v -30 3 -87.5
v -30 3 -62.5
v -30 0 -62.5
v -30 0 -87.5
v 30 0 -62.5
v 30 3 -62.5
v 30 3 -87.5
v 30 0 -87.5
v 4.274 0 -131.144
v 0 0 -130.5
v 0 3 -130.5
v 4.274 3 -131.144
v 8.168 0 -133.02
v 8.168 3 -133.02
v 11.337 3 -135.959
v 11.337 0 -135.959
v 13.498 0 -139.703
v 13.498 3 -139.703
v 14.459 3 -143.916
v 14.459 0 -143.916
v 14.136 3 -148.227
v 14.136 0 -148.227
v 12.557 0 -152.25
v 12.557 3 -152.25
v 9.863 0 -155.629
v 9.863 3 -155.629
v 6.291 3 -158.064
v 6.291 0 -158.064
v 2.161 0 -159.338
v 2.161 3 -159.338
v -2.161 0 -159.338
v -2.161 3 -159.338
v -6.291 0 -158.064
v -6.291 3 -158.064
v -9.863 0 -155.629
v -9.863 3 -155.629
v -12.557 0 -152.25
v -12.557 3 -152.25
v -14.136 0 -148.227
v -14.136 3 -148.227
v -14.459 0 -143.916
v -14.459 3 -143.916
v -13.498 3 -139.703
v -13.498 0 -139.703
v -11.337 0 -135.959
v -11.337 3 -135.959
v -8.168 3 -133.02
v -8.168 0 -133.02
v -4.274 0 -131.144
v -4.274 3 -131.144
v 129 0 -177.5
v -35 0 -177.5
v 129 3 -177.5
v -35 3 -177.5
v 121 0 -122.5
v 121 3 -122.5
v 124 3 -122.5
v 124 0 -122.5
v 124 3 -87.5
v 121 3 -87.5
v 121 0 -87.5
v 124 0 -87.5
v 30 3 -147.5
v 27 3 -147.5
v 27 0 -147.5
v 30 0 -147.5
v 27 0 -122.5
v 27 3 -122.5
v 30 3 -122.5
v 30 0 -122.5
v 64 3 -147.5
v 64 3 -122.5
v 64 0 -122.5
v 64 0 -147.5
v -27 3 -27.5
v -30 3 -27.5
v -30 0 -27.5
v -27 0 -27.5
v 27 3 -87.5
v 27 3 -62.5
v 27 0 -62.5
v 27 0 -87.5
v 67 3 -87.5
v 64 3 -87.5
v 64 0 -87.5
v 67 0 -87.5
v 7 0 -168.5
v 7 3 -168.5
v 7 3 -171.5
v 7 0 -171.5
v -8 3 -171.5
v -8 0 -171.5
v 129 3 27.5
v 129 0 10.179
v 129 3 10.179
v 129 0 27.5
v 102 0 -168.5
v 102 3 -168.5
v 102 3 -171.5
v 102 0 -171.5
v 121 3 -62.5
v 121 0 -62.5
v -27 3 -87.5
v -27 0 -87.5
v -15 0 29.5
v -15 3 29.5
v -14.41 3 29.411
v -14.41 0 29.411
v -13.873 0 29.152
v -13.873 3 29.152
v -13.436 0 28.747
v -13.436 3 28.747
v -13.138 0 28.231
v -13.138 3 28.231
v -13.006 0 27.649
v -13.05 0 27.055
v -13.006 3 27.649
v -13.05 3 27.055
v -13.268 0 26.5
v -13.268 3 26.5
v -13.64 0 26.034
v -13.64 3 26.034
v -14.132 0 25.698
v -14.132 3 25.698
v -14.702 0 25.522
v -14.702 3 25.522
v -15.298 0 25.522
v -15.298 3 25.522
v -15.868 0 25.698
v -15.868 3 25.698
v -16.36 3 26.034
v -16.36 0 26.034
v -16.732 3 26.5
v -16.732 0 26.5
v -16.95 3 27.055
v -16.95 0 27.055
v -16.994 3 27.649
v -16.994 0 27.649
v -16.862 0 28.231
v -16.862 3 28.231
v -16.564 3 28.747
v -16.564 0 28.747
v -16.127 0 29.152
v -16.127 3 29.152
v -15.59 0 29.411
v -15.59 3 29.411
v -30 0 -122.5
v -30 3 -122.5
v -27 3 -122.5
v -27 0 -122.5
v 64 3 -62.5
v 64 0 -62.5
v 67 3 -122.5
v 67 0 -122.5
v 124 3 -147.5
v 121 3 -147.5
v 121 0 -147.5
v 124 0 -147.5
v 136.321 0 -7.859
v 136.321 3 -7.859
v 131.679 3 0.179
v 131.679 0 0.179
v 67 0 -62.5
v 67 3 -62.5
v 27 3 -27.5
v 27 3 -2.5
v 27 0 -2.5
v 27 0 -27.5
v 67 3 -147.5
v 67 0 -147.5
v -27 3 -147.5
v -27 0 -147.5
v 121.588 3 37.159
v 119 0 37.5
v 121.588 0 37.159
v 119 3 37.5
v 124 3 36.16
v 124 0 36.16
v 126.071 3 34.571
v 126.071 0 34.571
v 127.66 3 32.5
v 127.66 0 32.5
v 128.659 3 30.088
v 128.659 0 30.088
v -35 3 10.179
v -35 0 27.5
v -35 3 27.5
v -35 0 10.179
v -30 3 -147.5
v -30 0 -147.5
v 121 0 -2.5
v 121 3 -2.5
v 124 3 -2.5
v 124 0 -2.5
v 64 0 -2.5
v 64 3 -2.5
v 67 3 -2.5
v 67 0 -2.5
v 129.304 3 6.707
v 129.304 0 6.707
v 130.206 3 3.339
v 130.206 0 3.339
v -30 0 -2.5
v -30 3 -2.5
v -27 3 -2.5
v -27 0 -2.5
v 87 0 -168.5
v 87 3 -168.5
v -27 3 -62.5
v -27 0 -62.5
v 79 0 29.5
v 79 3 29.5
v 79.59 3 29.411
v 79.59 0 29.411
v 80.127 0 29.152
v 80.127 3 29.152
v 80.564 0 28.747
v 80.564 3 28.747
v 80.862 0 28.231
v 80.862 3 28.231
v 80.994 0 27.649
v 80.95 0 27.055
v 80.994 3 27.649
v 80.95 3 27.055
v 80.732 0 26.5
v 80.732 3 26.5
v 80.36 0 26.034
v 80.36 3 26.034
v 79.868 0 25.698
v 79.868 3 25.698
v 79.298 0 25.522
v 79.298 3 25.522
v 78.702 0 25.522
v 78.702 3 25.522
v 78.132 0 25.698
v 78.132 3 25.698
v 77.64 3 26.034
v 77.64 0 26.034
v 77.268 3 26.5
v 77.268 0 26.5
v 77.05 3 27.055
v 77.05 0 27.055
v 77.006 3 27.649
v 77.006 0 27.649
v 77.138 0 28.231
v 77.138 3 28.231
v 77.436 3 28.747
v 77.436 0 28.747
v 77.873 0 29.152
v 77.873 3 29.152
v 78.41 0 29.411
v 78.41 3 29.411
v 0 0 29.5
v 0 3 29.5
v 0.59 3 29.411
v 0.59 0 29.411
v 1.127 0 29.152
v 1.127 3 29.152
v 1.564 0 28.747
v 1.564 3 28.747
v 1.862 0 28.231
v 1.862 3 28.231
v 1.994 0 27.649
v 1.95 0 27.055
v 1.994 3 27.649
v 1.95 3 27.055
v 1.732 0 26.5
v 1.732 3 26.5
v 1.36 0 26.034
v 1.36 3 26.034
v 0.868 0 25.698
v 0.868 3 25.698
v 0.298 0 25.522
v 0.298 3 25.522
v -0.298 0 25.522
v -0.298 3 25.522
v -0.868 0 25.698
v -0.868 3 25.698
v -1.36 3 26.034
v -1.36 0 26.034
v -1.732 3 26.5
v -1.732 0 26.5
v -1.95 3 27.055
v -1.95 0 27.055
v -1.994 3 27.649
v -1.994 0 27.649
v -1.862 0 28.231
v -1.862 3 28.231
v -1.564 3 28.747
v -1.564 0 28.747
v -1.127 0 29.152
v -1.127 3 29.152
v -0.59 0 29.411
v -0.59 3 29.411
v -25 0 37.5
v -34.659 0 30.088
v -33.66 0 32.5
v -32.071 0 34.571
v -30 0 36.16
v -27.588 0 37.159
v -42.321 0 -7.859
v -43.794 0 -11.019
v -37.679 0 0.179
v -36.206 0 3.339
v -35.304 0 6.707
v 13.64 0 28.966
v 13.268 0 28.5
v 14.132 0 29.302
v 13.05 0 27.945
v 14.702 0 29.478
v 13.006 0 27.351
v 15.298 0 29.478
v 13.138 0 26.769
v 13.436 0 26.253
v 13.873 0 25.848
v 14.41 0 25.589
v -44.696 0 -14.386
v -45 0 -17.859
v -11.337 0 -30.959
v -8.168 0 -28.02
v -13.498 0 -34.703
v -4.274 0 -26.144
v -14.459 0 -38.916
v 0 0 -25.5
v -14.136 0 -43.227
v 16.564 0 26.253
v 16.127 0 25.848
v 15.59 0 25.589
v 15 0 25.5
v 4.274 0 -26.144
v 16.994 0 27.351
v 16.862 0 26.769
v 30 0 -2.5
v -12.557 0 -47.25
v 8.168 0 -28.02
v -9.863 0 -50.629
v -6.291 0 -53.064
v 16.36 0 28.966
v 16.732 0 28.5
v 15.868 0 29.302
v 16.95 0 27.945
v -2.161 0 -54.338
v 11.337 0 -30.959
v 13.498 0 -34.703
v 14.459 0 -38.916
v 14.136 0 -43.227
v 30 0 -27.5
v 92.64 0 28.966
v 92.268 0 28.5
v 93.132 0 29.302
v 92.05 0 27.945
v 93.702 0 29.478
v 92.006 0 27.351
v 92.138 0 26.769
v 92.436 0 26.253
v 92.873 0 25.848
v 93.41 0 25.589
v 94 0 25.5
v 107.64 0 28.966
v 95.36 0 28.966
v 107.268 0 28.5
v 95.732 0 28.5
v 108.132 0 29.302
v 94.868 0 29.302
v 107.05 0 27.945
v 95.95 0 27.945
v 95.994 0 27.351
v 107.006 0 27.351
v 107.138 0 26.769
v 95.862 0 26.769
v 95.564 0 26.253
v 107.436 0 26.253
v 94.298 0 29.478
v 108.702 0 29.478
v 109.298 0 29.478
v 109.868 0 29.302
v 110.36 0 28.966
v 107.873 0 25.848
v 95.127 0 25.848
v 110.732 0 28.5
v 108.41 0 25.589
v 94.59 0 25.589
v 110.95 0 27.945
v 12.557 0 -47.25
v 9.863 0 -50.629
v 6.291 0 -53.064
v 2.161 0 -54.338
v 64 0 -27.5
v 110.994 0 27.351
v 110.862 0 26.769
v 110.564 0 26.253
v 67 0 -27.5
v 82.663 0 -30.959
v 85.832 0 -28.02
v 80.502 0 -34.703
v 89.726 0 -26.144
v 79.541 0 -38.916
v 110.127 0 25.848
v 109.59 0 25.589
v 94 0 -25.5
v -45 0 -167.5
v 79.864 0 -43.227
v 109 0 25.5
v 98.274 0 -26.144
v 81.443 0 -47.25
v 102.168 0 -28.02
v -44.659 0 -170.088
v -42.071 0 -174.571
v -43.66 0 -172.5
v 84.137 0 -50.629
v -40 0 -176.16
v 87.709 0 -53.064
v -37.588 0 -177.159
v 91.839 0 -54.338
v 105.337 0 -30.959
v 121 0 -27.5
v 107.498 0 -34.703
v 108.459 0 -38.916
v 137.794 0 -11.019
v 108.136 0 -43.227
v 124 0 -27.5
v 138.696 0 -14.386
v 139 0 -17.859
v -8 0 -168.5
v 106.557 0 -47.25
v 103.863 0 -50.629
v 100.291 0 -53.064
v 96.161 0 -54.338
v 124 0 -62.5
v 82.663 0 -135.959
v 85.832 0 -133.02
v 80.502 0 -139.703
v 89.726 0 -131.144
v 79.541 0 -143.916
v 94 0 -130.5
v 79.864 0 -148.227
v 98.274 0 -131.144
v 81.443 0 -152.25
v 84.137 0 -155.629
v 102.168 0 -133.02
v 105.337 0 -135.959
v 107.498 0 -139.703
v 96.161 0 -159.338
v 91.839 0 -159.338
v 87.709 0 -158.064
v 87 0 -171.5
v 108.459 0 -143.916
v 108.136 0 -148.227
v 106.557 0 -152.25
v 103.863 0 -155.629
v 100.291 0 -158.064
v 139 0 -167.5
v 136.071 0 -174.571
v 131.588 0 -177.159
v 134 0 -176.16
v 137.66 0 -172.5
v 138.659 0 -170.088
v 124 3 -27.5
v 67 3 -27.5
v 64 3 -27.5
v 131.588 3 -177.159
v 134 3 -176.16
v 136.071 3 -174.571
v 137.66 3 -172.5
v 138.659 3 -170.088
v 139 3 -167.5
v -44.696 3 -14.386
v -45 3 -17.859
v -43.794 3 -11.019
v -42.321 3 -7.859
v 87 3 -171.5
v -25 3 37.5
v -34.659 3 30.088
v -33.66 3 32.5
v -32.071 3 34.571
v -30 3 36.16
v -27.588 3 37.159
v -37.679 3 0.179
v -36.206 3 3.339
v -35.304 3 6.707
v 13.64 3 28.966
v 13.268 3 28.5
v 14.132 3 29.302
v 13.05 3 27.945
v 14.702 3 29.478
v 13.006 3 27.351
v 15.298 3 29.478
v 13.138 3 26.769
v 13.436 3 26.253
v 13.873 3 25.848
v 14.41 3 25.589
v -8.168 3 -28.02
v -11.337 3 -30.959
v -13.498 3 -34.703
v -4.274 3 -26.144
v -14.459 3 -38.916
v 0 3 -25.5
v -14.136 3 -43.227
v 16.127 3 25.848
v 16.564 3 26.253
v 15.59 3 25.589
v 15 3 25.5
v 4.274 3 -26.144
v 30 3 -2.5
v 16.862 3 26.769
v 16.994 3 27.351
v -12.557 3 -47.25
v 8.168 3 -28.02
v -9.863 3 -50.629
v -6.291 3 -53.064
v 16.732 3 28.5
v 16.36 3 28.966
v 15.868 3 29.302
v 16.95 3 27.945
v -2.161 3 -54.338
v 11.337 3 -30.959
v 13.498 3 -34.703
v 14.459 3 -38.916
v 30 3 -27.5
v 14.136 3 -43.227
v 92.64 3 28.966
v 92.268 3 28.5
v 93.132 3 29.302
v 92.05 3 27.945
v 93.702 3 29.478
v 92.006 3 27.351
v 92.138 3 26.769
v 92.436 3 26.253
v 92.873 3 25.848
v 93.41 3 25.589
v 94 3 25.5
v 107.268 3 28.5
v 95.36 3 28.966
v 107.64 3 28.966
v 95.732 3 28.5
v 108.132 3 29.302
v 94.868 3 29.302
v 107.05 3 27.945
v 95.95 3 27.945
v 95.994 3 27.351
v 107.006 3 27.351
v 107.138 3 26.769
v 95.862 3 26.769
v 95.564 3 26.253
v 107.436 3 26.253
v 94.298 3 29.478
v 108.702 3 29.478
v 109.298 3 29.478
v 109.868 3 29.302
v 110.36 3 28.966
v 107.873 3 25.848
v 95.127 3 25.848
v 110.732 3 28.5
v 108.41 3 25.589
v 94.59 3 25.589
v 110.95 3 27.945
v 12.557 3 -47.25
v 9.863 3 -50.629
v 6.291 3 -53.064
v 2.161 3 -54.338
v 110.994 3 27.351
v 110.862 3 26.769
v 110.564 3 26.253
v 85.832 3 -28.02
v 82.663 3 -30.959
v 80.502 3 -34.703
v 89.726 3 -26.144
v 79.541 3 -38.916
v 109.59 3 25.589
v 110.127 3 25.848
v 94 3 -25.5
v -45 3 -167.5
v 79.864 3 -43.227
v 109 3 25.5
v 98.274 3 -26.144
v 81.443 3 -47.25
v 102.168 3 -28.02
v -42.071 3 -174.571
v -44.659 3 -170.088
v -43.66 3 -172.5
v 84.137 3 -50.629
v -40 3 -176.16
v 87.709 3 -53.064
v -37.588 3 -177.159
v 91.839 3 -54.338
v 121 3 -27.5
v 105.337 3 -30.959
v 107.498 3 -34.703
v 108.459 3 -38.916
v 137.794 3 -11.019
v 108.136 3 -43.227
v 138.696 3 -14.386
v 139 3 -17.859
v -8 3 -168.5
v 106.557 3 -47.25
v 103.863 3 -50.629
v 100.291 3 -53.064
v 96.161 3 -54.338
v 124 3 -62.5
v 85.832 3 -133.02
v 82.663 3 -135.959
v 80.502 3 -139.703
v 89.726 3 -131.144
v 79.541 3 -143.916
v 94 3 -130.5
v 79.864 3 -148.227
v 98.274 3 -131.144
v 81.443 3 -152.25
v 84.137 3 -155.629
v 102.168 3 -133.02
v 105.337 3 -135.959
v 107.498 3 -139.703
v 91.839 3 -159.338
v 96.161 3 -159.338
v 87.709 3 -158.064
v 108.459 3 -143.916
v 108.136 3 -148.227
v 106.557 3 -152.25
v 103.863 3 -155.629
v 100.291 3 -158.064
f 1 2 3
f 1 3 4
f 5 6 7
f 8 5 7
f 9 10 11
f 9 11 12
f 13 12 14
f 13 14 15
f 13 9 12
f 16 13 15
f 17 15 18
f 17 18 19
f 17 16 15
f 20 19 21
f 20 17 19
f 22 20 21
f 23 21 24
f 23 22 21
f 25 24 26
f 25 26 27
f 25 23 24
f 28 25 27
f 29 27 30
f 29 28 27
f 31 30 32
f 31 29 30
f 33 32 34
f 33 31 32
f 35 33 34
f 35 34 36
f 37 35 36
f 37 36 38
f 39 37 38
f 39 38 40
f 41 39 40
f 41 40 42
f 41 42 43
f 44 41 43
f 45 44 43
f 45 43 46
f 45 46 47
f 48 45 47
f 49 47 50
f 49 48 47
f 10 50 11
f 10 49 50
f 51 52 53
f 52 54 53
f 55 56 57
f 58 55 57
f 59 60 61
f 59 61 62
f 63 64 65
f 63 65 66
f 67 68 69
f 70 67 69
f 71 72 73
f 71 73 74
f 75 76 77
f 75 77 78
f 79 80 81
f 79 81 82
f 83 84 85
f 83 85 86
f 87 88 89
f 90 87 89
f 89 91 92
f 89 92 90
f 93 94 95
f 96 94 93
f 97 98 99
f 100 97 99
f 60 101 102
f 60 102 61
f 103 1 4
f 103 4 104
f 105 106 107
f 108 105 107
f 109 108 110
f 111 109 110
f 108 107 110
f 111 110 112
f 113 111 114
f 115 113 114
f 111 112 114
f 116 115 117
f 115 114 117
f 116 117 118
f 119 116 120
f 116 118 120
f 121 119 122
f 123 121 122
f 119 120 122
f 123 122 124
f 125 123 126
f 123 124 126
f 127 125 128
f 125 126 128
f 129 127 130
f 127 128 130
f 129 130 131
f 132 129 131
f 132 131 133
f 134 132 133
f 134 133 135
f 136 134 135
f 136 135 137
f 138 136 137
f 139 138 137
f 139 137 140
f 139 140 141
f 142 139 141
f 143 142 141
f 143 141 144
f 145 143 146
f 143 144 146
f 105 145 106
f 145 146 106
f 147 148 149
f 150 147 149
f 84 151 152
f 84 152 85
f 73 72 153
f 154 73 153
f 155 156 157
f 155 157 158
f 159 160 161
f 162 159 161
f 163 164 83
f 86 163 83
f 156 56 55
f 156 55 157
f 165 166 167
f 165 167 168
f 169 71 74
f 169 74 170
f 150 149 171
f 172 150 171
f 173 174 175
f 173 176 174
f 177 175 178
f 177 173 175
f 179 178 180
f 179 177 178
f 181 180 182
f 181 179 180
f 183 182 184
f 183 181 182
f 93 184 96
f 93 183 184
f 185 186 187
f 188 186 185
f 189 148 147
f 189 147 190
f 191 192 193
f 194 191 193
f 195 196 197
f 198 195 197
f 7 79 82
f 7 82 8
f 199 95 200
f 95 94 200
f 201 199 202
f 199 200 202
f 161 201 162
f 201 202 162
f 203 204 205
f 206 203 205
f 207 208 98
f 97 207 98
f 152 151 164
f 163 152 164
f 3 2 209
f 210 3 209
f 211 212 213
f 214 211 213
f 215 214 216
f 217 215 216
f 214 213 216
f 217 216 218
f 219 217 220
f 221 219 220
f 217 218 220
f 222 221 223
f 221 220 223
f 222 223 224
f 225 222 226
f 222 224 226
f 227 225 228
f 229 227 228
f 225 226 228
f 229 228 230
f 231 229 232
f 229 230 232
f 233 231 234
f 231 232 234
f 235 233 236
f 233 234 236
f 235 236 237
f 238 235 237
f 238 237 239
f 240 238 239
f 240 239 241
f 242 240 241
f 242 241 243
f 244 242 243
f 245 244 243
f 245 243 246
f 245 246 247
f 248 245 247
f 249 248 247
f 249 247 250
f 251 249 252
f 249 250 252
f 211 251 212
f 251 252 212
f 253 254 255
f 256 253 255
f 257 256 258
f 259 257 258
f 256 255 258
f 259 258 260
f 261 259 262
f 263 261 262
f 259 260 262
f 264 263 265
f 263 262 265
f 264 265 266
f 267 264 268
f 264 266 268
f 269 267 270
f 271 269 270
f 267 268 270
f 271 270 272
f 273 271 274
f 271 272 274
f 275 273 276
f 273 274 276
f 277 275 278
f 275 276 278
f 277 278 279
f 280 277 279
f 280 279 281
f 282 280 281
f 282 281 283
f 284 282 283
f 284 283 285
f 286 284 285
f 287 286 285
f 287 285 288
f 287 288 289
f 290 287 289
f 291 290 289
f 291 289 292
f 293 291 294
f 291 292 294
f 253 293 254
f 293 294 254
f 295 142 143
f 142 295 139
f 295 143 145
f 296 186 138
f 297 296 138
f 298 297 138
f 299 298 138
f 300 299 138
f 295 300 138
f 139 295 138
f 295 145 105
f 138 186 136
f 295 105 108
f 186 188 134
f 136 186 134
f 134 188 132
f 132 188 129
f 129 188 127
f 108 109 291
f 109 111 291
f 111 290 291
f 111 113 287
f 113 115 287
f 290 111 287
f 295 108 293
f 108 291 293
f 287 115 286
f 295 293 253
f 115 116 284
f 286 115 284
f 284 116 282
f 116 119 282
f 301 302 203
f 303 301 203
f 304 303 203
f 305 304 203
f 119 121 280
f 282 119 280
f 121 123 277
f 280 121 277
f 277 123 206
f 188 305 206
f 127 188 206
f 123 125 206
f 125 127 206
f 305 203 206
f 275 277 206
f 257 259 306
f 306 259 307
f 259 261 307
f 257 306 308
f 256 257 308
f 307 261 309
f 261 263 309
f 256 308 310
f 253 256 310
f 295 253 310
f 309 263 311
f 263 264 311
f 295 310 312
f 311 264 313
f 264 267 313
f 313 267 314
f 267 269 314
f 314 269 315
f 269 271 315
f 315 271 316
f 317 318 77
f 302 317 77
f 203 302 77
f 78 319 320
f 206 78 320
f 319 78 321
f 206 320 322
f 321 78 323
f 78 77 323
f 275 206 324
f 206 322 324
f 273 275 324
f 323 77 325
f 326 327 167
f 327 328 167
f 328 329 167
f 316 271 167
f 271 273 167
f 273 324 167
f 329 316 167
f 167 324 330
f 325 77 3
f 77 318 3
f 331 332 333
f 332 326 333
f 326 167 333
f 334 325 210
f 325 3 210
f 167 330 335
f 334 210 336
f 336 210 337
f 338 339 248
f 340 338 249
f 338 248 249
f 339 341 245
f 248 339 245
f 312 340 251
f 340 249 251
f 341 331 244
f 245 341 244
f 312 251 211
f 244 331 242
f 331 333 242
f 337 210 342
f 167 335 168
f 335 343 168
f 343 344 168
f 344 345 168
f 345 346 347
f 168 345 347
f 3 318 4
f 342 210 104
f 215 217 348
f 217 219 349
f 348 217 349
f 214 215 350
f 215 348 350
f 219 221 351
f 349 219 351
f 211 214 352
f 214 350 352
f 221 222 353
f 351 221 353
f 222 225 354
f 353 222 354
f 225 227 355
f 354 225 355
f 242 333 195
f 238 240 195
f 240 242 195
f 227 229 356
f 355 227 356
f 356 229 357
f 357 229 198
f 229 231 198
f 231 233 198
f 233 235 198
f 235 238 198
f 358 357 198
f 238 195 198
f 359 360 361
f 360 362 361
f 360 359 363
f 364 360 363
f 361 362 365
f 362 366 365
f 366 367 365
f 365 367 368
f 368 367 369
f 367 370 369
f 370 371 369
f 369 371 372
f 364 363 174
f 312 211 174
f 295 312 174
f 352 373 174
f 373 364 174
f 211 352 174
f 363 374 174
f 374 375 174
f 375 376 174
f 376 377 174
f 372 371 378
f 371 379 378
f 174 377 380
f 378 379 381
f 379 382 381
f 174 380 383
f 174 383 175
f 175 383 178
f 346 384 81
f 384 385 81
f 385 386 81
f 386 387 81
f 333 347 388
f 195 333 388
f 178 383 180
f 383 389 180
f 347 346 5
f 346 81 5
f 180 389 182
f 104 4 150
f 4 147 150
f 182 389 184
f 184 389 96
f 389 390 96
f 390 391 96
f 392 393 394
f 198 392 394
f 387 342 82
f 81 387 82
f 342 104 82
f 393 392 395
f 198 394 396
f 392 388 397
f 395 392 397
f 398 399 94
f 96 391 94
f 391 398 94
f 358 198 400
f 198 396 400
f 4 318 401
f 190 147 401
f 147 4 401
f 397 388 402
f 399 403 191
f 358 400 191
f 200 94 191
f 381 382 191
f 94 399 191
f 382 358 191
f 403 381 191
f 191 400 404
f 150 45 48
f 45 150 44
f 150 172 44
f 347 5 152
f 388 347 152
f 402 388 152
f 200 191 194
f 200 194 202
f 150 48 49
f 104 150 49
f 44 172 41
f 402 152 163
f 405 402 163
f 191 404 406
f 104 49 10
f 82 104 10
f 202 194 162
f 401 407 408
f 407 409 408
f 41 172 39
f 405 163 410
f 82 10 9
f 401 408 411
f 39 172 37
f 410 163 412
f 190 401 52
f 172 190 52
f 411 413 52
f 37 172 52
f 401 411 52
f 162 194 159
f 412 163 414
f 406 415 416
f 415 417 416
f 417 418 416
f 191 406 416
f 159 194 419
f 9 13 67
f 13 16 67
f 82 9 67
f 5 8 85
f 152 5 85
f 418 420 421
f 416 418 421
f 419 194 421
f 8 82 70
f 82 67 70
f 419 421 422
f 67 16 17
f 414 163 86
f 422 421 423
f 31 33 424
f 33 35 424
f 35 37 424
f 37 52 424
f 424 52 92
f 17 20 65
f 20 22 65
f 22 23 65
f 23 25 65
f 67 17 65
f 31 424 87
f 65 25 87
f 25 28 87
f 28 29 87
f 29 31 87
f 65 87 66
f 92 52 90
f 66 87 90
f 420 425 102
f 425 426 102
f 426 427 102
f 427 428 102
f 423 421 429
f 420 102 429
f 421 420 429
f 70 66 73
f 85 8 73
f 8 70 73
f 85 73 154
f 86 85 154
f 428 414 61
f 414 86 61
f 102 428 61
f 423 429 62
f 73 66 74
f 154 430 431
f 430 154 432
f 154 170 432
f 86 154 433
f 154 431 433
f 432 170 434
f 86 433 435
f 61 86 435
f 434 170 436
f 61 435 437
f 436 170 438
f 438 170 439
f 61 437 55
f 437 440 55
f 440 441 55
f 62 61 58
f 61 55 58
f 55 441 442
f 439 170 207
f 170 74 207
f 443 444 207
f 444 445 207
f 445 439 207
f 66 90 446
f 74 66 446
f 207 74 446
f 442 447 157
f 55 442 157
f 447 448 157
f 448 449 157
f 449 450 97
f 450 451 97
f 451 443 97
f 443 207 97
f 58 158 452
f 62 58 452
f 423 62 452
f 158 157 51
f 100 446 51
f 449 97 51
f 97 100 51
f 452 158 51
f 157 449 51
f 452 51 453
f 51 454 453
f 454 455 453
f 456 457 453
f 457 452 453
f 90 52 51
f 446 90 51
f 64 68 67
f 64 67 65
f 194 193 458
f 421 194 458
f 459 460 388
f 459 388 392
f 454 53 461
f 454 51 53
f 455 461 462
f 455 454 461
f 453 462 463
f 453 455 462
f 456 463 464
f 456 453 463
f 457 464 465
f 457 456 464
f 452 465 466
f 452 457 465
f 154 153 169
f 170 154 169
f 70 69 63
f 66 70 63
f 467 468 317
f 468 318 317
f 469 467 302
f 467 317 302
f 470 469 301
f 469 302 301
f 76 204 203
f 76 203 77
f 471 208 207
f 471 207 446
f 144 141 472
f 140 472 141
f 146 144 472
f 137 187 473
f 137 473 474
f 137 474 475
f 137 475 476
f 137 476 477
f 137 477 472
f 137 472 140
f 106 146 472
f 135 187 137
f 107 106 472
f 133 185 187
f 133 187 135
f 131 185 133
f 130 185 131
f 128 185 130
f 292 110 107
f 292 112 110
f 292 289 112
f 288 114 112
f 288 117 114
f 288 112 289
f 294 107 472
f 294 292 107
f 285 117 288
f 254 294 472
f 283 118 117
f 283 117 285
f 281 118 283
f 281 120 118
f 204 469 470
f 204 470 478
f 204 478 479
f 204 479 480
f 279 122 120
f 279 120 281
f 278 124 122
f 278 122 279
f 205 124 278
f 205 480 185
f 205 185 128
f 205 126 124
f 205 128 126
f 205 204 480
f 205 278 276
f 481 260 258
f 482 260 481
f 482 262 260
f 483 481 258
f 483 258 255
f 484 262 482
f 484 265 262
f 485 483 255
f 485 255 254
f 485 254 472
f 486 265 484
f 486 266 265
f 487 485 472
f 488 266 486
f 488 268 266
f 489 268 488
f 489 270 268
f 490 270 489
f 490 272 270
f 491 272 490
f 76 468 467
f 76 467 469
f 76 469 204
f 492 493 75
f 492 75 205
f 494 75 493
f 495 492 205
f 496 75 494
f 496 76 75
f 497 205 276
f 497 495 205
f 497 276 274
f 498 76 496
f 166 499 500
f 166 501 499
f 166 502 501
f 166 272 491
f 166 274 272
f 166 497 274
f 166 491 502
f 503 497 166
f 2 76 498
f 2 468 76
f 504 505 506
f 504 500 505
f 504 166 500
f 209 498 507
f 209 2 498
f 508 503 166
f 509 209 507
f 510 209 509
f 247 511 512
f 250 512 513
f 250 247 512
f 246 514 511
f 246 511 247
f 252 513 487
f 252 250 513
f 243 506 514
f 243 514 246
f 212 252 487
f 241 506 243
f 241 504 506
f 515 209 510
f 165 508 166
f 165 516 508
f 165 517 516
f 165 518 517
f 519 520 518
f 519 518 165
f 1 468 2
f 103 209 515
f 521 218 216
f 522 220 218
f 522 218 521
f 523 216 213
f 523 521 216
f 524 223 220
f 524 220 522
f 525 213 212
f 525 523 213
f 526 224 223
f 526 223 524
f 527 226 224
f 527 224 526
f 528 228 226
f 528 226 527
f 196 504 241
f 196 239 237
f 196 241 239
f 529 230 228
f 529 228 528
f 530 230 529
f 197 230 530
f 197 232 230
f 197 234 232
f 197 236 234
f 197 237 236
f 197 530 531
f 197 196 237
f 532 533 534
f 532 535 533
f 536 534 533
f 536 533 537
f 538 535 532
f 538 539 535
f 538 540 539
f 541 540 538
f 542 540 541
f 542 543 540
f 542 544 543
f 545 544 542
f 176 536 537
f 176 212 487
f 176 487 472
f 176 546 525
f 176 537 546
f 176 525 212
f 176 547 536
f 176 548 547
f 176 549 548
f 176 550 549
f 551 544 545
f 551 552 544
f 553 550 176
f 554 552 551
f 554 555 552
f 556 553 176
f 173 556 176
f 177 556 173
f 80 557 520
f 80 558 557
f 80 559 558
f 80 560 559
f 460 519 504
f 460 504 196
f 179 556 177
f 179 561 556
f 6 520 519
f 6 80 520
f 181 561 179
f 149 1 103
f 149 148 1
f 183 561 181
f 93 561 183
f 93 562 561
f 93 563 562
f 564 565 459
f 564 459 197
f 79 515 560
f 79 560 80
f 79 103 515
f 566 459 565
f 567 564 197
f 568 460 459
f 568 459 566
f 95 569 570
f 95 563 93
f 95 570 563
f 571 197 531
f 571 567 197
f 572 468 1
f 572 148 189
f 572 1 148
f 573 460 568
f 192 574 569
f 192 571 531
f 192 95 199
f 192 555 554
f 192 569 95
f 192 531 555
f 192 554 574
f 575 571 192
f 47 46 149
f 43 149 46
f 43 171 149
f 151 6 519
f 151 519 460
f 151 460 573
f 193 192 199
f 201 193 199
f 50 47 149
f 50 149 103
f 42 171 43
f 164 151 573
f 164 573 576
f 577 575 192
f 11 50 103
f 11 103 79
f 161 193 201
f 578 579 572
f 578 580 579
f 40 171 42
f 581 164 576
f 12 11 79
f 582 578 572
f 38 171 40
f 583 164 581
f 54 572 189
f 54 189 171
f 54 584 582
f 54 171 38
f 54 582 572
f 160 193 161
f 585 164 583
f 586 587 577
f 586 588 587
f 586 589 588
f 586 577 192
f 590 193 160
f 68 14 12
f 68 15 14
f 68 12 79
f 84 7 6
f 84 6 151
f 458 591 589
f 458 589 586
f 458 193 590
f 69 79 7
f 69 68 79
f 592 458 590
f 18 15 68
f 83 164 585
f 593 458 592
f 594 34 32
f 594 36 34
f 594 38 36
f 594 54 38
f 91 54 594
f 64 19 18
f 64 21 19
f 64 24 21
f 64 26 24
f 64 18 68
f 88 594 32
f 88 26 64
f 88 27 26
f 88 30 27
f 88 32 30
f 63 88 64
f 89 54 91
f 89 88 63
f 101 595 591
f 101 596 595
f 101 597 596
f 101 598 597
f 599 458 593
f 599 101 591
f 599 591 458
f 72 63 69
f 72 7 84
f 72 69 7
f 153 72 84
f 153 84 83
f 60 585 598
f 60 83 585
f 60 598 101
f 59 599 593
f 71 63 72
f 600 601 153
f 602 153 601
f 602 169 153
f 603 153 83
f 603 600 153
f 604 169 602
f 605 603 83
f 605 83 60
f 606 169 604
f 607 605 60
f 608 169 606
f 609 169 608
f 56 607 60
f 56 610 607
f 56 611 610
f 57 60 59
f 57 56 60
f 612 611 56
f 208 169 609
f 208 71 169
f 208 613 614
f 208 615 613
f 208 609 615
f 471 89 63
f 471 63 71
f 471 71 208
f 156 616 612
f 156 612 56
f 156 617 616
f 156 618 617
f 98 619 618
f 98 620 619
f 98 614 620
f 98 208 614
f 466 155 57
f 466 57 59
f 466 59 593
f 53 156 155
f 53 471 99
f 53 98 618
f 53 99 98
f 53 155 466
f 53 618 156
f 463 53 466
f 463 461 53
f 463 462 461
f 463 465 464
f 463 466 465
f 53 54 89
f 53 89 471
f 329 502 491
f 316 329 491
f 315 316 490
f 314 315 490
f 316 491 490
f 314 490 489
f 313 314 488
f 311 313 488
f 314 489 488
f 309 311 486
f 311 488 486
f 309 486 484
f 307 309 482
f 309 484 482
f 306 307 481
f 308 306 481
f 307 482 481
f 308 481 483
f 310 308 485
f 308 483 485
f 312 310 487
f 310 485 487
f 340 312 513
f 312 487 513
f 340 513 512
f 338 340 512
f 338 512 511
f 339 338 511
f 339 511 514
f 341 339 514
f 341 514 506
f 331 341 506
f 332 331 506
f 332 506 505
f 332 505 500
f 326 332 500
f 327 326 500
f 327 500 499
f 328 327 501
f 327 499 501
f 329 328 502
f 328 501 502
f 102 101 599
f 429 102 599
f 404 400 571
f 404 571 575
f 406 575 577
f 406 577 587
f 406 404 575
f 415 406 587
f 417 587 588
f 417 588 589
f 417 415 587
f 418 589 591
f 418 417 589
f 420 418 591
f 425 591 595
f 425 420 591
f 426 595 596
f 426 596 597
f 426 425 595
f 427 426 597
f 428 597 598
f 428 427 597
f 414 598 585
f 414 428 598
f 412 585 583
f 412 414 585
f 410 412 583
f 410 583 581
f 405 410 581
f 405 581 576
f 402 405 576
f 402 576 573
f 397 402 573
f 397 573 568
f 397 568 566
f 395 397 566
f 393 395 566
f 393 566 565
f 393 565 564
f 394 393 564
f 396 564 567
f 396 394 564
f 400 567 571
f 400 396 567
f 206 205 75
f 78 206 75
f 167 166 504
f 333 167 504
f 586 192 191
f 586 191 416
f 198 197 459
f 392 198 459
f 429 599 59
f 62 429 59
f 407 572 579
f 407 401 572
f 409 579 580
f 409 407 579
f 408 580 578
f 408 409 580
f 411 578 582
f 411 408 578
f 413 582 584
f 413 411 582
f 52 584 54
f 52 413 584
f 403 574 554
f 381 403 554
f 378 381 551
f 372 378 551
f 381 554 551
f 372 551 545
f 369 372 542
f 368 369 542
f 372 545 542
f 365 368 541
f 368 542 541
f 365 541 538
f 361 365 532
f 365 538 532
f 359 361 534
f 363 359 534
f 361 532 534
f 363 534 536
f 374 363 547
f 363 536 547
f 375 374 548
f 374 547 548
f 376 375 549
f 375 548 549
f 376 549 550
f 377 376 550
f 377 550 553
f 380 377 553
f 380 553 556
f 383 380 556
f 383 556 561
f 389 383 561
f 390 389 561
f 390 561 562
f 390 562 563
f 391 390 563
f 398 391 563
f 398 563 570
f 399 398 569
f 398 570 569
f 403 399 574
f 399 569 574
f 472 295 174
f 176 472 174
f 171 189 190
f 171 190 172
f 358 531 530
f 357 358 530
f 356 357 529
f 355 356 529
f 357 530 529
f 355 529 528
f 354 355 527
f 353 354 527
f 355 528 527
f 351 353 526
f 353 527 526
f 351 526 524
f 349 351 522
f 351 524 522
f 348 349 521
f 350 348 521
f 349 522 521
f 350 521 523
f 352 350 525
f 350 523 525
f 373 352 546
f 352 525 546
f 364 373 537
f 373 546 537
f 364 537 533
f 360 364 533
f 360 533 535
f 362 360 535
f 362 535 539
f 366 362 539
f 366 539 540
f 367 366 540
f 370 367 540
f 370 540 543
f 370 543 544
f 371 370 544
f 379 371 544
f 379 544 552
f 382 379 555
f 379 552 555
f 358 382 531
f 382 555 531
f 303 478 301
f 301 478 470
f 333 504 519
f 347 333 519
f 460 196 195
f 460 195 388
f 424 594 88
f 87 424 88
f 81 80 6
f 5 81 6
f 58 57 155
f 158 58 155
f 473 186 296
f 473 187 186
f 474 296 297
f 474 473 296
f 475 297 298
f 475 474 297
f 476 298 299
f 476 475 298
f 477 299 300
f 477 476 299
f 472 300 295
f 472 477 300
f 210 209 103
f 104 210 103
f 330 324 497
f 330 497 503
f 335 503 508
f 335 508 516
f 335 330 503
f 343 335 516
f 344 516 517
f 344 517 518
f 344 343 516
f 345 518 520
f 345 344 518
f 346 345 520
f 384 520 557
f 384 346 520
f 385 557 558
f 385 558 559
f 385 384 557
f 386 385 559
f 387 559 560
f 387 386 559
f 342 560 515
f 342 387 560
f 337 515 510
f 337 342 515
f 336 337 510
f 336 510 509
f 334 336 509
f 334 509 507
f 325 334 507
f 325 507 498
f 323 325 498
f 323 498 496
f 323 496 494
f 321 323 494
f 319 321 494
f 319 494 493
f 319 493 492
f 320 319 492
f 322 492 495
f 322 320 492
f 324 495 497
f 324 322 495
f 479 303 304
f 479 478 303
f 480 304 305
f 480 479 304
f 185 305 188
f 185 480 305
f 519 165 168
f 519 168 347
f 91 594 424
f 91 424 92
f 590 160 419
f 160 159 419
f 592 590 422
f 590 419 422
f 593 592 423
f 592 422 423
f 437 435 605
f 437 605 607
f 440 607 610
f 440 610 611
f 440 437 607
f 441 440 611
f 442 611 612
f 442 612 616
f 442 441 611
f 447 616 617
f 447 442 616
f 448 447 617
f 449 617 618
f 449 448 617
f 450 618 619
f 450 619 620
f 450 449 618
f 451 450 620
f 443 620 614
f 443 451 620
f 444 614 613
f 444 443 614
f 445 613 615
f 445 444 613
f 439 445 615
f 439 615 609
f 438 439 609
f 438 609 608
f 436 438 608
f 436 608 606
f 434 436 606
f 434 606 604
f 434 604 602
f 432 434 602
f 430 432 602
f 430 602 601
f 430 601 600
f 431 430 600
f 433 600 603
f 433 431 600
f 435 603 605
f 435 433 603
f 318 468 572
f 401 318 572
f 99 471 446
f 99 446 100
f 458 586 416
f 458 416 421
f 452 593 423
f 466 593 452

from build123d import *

# Parameters (mm, degrees)
SKETCH_1_W          = 164
SKETCH_1_H          = 215
SKETCH_1_R          = 14.5
EXTRUDE_1_DEPTH     = 3
SKETCH_2_R          = 2
CUT_EXTRUDE_1_DEPTH = 3
SKETCH_3_W          = 3
SKETCH_3_H          = 25
CUT_EXTRUDE_2_DEPTH = 10
SKETCH_4_W          = 15
SKETCH_4_H          = 3
CUT_EXTRUDE_3_DEPTH = 10
SKETCH_6_W          = 10
SKETCH_6_H          = 190
EXTRUDE_2_DEPTH     = 3
CHAMFER_1_SIZE      = 25
CHAMFER_1_SIZE_2    = 14.43375673
FILLET_3_R          = 20
FILLET_4_R          = 10


with BuildPart() as part:
    # 草图1 → 凸台-拉伸1 (new body)
    with BuildSketch(Plane(origin=(0, 0, 0), x_dir=(1, 0, 0), z_dir=(0, 1, 0))):
        with Locations((47, 70)):
            Rectangle(SKETCH_1_W, SKETCH_1_H)
        with Locations(Location((94, 40, 0), (0, 0, 270))):
            Circle(SKETCH_1_R, mode=Mode.SUBTRACT)
        with Locations(Location((0, 40, 0), (0, 0, 270))):
            Circle(SKETCH_1_R, mode=Mode.SUBTRACT)
        with Locations(Location((0, 145, 0), (0, 0, 270))):
            Circle(SKETCH_1_R, mode=Mode.SUBTRACT)
        with Locations(Location((94, 145, 0), (0, 0, 270))):
            Circle(SKETCH_1_R, mode=Mode.SUBTRACT)
    extrude(amount=EXTRUDE_1_DEPTH)

    # 草图2 → 切除-拉伸1 (cut)
    with BuildSketch(Plane(origin=(0, 3, 0), x_dir=(1, 0, 0), z_dir=(0, 1, 0))):
        with Locations(Location((0, -27.5, 0), (0, 0, 270))):
            Circle(SKETCH_2_R)
        with Locations(Location((-15, -27.5, 0), (0, 0, 270))):
            Circle(SKETCH_2_R)
        with Locations(Location((15, -27.5, 0), (0, 0, 90))):
            Circle(SKETCH_2_R)
        with Locations(Location((79, -27.5, 0), (0, 0, 270))):
            Circle(SKETCH_2_R)
        with Locations(Location((109, -27.5, 0), (0, 0, 90))):
            Circle(SKETCH_2_R)
        with Locations(Location((94, -27.5, 0), (0, 0, 90))):
            Circle(SKETCH_2_R)
    extrude(amount=-CUT_EXTRUDE_1_DEPTH, mode=Mode.SUBTRACT)

    # 草图3 → 切除-拉伸2 (cut)
    with BuildSketch(Plane(origin=(0, 3, 0), x_dir=(1, 0, 0), z_dir=(0, 1, 0))):
        with Locations((28.5, 135)):
            Rectangle(SKETCH_3_W, SKETCH_3_H)
        with Locations((65.5, 135)):
            Rectangle(SKETCH_3_W, SKETCH_3_H)
        with Locations((28.5, 75)):
            Rectangle(SKETCH_3_W, SKETCH_3_H)
        with Locations((65.5, 75)):
            Rectangle(SKETCH_3_W, SKETCH_3_H)
        with Locations((28.5, 15)):
            Rectangle(SKETCH_3_W, SKETCH_3_H)
        with Locations((65.5, 15)):
            Rectangle(SKETCH_3_W, SKETCH_3_H)
        with Locations((-28.5, 15)):
            Rectangle(SKETCH_3_W, SKETCH_3_H)
        with Locations((-28.5, 75)):
            Rectangle(SKETCH_3_W, SKETCH_3_H)
        with Locations((-28.5, 135)):
            Rectangle(SKETCH_3_W, SKETCH_3_H)
        with Locations((122.5, 135)):
            Rectangle(SKETCH_3_W, SKETCH_3_H)
        with Locations((122.5, 75)):
            Rectangle(SKETCH_3_W, SKETCH_3_H)
        with Locations((122.5, 15)):
            Rectangle(SKETCH_3_W, SKETCH_3_H)
    extrude(amount=-CUT_EXTRUDE_2_DEPTH, mode=Mode.SUBTRACT)

    # 草图4 → 切除-拉伸3 (cut)
    with BuildSketch(Plane(origin=(0, 3, 0), x_dir=(1, 0, 0), z_dir=(0, 1, 0))):
        with Locations((-0.5, 170)):
            Rectangle(SKETCH_4_W, SKETCH_4_H)
        with Locations((94.5, 170)):
            Rectangle(SKETCH_4_W, SKETCH_4_H)
    extrude(amount=-CUT_EXTRUDE_3_DEPTH, mode=Mode.SUBTRACT)

    # 草图6 → 凸台-拉伸2 (add)
    with BuildSketch(Plane(origin=(0, 3, 0), x_dir=(1, 0, 0), z_dir=(0, 1, 0))):
        with Locations((-40, 82.5)):
            Rectangle(SKETCH_6_W, SKETCH_6_H)
        with Locations((134, 82.5)):
            Rectangle(SKETCH_6_W, SKETCH_6_H)
    extrude(amount=-EXTRUDE_2_DEPTH)

    # 倒角1
    # the kernel refuses this chamfer: 25, 14.43375673 mm, written as the material it takes off along each edge
    with BuildSketch(Plane(origin=(139, 67.677143866, 12.5), x_dir=(0.019326765612700705, 0, -0.9998132206222079), z_dir=(0, -1, 0))) as chamfer_1_piece_1_section:
        Polygon((CHAMFER_1_SIZE * 0.999813220622, -CHAMFER_1_SIZE * 0.0193267656127), (-CHAMFER_1_SIZE_2 * 0.0193267656124, -CHAMFER_1_SIZE_2 * 0.999813220604), (0, 0), align=None)
    chamfer_1_piece_1 = extrude(amount=132.354287732, mode=Mode.PRIVATE)
    chamfer_1_piece_1 = split(chamfer_1_piece_1, bisect_by=Plane(origin=(129, 1.5, 3.344472452), z_dir=(1, 0, 0)), keep=Keep.TOP, mode=Mode.PRIVATE)
    add(chamfer_1_piece_1, mode=Mode.SUBTRACT)
    with BuildSketch(Plane(origin=(-45, 67.677143866, 12.5), x_dir=(0.9983227437537926, 0, 0.057893862402670776), z_dir=(0, -1, 0))) as chamfer_1_piece_2_section:
        Polygon((CHAMFER_1_SIZE_2 * 0.998322743736, -CHAMFER_1_SIZE_2 * 0.0578938624016), (-CHAMFER_1_SIZE * 0.0578938624027, -CHAMFER_1_SIZE * 0.998322743754), (0, 0), align=None)
    chamfer_1_piece_2 = extrude(amount=132.354287732, mode=Mode.PRIVATE)
    chamfer_1_piece_2 = split(chamfer_1_piece_2, bisect_by=Plane(origin=(-35, 1.5, 3.344472452), z_dir=(-1, 0, 0)), keep=Keep.TOP, mode=Mode.PRIVATE)
    add(chamfer_1_piece_2, mode=Mode.SUBTRACT)

    # 圆角3
    fillet_3_edges = [part.edges().sort_by_distance(p)[0] for p in [
        (139, 1.5, -12.5),
        (-45, 1.5, -12.5),
        (129, 1.5, 4.820508076),
        (-35, 1.5, 4.820508076),
    ]]
    fillet(fillet_3_edges, radius=FILLET_3_R)

    # 圆角4
    fillet_4_edges = [part.edges().sort_by_distance(p)[0] for p in [
        (-35, 1.5, 37.5),
        (129, 1.5, 37.5),
        (-45, 1.5, -177.5),
        (139, 1.5, -177.5),
    ]]
    fillet(fillet_4_edges, radius=FILLET_4_R)


solid = part.part
